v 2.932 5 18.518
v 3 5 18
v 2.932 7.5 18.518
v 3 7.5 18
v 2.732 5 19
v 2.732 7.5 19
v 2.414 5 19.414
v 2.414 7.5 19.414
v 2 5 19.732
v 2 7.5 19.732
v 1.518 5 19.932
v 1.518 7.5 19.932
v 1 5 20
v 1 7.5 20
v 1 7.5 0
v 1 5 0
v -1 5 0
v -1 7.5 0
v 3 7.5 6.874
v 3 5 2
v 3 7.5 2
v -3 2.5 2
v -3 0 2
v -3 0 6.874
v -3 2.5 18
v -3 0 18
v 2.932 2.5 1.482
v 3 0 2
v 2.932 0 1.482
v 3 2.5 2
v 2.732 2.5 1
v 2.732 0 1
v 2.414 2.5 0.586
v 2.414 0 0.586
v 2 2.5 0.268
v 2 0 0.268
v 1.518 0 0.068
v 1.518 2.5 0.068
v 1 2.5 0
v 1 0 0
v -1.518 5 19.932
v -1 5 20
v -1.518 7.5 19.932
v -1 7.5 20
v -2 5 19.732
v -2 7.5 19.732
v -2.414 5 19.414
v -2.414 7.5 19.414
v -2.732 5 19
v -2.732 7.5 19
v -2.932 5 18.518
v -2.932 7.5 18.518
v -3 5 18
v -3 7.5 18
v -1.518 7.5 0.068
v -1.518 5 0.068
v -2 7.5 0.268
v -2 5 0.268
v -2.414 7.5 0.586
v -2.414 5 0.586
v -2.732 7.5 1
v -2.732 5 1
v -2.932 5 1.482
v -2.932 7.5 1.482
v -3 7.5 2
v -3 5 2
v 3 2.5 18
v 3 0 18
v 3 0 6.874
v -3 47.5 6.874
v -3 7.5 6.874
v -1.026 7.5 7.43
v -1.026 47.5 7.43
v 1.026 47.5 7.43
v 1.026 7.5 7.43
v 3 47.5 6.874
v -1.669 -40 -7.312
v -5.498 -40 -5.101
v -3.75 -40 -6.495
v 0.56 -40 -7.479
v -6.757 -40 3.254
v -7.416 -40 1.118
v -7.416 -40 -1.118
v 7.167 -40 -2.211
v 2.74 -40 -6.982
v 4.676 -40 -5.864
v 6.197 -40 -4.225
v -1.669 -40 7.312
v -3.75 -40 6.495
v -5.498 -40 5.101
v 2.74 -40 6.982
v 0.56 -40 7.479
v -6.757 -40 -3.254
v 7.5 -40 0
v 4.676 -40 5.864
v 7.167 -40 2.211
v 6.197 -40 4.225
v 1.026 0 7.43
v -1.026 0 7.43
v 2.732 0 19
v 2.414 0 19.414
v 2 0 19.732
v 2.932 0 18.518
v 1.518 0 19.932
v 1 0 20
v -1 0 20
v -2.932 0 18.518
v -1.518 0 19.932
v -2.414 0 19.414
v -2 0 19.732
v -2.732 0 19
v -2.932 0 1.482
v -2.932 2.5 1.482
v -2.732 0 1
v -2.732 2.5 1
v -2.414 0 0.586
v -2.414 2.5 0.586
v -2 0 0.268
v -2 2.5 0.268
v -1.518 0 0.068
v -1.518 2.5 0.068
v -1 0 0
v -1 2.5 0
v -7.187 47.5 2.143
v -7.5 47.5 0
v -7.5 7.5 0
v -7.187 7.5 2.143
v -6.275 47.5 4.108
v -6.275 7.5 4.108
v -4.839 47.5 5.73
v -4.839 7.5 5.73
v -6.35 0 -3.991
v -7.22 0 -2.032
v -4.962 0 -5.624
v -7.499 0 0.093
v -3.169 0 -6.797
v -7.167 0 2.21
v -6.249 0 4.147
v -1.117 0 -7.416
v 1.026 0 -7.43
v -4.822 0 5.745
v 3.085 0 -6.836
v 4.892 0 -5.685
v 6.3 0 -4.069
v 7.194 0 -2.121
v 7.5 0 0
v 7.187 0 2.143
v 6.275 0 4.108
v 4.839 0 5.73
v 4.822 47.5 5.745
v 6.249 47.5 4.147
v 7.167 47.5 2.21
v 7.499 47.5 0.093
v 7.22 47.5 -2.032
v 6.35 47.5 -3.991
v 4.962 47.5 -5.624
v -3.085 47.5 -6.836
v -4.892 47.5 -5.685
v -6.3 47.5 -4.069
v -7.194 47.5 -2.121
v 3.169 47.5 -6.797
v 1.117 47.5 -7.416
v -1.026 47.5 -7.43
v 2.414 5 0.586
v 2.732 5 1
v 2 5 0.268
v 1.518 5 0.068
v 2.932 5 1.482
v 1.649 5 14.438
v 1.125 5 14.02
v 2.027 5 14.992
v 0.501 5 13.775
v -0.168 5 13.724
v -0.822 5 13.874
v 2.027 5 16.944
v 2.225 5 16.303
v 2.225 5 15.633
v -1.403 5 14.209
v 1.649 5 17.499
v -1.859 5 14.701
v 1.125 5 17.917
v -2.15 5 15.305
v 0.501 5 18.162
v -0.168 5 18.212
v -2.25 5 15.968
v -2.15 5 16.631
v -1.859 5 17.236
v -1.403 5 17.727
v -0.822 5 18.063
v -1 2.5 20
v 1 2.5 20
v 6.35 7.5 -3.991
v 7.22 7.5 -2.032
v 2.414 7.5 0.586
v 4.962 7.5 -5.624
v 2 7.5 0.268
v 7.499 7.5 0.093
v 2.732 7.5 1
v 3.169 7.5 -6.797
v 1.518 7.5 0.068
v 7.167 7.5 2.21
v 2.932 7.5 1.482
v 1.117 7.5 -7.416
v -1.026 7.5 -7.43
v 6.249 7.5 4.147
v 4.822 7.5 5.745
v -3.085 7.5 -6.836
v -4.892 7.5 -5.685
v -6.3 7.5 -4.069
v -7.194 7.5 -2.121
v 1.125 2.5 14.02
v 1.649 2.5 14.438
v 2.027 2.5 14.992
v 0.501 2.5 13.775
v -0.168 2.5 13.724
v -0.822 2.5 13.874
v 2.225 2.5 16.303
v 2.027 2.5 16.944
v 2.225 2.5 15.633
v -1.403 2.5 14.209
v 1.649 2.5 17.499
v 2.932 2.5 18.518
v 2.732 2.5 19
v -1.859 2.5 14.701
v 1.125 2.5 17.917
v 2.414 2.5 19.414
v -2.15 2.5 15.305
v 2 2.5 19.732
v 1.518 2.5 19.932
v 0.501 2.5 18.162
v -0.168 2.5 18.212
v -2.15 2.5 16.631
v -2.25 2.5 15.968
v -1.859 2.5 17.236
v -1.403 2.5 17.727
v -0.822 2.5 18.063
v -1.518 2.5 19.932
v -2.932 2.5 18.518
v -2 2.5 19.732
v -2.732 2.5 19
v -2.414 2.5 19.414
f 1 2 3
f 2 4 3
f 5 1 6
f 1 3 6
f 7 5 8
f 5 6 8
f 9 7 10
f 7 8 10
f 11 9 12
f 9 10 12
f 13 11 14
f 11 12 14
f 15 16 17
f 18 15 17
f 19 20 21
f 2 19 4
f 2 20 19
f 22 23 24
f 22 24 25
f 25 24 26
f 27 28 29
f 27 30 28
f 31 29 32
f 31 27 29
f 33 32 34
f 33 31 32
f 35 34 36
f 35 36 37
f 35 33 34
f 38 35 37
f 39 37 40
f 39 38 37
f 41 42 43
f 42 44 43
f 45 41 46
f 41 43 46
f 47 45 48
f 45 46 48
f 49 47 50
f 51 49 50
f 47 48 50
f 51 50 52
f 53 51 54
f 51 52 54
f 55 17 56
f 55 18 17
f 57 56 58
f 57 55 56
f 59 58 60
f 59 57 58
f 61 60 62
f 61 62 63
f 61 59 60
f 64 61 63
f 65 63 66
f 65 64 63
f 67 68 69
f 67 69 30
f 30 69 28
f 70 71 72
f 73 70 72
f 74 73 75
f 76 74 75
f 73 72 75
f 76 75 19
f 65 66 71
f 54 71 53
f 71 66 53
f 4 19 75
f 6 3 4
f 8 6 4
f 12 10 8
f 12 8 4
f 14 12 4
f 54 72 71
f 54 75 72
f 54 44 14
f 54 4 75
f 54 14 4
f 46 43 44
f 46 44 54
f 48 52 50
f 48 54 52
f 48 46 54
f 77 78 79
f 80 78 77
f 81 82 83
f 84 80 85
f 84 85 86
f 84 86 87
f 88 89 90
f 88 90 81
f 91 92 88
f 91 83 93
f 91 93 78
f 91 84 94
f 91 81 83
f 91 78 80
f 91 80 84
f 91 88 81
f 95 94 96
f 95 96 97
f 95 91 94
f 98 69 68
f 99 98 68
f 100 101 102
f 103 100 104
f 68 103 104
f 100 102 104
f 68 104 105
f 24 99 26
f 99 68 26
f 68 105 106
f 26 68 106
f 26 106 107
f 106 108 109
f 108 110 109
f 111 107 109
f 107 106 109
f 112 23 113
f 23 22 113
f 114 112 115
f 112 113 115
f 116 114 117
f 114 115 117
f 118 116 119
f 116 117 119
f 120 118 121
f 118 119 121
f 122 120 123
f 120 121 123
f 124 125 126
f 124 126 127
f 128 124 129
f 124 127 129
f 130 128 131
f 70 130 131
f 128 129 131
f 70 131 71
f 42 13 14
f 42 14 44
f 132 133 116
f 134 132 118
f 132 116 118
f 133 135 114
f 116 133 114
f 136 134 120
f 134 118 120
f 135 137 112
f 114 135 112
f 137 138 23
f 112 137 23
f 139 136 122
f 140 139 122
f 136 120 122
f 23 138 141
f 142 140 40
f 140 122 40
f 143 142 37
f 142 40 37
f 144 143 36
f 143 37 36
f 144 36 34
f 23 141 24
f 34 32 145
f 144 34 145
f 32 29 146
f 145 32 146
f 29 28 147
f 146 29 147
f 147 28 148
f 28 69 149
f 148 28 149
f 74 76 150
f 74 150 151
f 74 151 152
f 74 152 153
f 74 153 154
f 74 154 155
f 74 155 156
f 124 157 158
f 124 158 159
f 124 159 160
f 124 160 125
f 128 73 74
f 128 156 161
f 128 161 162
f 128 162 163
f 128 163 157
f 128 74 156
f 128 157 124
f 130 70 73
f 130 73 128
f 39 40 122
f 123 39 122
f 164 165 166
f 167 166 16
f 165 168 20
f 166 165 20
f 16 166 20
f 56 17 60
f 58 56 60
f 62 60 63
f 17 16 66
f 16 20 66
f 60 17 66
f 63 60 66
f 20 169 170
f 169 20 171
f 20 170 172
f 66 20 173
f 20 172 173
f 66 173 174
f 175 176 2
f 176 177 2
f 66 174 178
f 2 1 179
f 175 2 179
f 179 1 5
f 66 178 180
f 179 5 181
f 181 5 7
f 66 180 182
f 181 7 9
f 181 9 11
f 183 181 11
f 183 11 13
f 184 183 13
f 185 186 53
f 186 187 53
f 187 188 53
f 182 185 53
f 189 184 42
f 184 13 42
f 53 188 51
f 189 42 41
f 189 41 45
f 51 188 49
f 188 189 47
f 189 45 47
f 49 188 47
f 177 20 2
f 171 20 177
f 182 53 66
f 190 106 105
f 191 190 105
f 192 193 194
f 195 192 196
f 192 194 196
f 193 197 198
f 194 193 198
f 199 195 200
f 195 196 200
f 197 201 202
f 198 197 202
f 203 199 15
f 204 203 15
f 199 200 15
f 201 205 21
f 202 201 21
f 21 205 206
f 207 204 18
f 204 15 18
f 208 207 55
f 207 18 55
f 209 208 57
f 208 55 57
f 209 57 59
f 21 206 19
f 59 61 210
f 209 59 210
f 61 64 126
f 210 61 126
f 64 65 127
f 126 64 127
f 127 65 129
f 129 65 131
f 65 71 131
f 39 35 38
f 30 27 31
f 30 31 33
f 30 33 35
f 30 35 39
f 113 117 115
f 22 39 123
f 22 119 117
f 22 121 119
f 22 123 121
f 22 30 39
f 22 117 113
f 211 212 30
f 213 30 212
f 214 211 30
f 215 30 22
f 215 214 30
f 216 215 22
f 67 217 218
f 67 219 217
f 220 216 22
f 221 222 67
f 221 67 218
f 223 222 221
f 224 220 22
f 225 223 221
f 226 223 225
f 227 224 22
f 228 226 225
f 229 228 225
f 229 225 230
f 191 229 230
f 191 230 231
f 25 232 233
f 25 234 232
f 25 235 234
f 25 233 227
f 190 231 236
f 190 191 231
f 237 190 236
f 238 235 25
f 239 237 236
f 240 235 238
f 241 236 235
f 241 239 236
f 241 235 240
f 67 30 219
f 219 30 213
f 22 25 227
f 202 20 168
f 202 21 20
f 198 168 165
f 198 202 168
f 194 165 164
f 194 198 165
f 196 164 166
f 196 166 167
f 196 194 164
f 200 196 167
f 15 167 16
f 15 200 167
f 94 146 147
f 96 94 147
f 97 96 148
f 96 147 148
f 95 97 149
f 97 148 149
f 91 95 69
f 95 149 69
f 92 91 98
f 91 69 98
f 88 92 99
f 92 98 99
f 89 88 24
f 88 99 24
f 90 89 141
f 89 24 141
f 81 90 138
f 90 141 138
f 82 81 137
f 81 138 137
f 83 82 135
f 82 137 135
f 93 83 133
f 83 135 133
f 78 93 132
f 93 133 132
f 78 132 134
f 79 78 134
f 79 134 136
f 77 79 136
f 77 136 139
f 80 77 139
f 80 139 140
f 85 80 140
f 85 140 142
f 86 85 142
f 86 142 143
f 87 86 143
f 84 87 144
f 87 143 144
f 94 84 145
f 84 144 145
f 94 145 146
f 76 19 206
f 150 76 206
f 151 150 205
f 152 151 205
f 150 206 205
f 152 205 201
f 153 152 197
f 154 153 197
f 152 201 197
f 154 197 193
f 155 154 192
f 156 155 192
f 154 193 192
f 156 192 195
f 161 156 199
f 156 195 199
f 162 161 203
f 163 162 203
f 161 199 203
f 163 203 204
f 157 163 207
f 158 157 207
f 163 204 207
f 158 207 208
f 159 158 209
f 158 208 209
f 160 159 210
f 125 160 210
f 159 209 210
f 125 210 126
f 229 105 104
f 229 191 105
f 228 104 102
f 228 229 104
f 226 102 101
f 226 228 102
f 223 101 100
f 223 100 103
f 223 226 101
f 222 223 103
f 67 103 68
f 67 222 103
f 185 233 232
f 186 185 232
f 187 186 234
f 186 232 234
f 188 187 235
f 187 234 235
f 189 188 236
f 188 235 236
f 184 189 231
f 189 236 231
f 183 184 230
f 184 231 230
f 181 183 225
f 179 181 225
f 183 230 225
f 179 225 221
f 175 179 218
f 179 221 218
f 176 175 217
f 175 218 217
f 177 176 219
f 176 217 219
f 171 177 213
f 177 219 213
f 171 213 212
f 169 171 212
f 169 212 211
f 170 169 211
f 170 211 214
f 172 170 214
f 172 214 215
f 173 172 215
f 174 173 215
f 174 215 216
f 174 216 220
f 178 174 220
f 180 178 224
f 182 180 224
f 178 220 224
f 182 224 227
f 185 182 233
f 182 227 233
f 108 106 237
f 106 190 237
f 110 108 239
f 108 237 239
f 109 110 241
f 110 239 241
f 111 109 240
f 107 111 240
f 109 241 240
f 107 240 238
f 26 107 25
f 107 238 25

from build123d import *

# Parameters (mm, degrees)
F0_R      = 7.5
F1_DEPTH  = 40
F3_DEPTH  = 2.5
F4_R      = 2
F5_R      = 2.25
F6_DEPTH  = 2.5
F7_W      = 6
F7_H      = 20
F7_R      = 2.25
F8_DEPTH  = 2.5
F9_R      = 2
F11_DEPTH = 40


with BuildPart() as f1:
    # F0 (on Front) → F1 (new body)
    with BuildSketch(Plane.XZ):
        Circle(F0_R)
    extrude(amount=F1_DEPTH)

    # F2 (on face) → F3 (join)
    with BuildSketch(Plane(origin=(0, 0, 0), x_dir=(-1, 0, 0), z_dir=(0, 1, 0))):
        with BuildLine():
            Line((3, 20), (-3, 20))
            Line((-3, 20), (-3, 6.873864))
            ThreePointArc((-3, 6.873864), (0, 7.5), (3, 6.873864))
            Line((3, 6.873864), (3, 20))
        make_face()
        with BuildLine():
            ThreePointArc((3, 6.873864), (0, 7.5), (-3, 6.873864))
            Line((-3, 6.873864), (-3, 0))
            Line((-3, 0), (3, 0))
            Line((3, 0), (3, 6.873864))
        make_face()
    extrude(amount=F3_DEPTH)

    # F4
    f4_edges = [f1.edges().sort_by_distance(p)[0] for p in [
        (3, 1.25, 20),
        (-3, 1.25, 20),
        (3, 1.25, 0),
        (-3, 1.25, 0),
    ]]
    fillet(f4_edges, radius=F4_R)

    # F5 (on face) → F6 (join)
    with BuildSketch(Plane(origin=(0, 2.5, 0), x_dir=(-1, 0, 0), z_dir=(0, 1, 0))):
        with Locations((0, 15.968132)):
            Circle(F5_R)
    extrude(amount=F6_DEPTH)

    # F7 (on face) → F8 (join)
    with BuildSketch(Plane(origin=(0, 5, 0), x_dir=(-1, 0, 0), z_dir=(0, 1, 0))):
        with Locations((0, 10)):
            Rectangle(F7_W, F7_H)
        with Locations((0, 15.968132)):
            Circle(F7_R, mode=Mode.SUBTRACT)
        with Locations((0, 15.968132)):
            Circle(F7_R)
    extrude(amount=F8_DEPTH)

    # F9
    f9_edges = [f1.edges().sort_by_distance(p)[0] for p in [
        (3, 6.25, 20),
        (-3, 6.25, 20),
        (3, 6.25, 0),
        (-3, 6.25, 0),
    ]]
    fillet(f9_edges, radius=F9_R)

    # F10 (on face) → F11 (join)
    with BuildSketch(Plane(origin=(0, 7.5, 0), x_dir=(-1, 0, 0), z_dir=(0, 1, 0))):
        with BuildLine():
            Line((3, 2), (3, 6.873864))
            ThreePointArc((3, 6.873864), (0, 7.5), (-3, 6.873864))
            Line((-3, 6.873864), (-3, 2))
            ThreePointArc((-3, 2), (-2.414214, 0.585786), (-1, 0))
            Line((-1, 0), (1, 0))
            ThreePointArc((1, 0), (2.414214, 0.585786), (3, 2))
        make_face()
        with BuildLine():
            ThreePointArc((-3, 6.873864), (-4.107919, -6.27495), (7.5, 0))
            ThreePointArc((7.5, 0), (6.27495, 4.107919), (3, 6.873864))
            Line((3, 6.873864), (3, 2))
            ThreePointArc((3, 2), (2.414214, 0.585786), (1, 0))
            Line((1, 0), (-1, 0))
            ThreePointArc((-1, 0), (-2.414214, 0.585786), (-3, 2))
            Line((-3, 2), (-3, 6.873864))
        make_face()
    extrude(amount=F11_DEPTH)


solid = f1.part
